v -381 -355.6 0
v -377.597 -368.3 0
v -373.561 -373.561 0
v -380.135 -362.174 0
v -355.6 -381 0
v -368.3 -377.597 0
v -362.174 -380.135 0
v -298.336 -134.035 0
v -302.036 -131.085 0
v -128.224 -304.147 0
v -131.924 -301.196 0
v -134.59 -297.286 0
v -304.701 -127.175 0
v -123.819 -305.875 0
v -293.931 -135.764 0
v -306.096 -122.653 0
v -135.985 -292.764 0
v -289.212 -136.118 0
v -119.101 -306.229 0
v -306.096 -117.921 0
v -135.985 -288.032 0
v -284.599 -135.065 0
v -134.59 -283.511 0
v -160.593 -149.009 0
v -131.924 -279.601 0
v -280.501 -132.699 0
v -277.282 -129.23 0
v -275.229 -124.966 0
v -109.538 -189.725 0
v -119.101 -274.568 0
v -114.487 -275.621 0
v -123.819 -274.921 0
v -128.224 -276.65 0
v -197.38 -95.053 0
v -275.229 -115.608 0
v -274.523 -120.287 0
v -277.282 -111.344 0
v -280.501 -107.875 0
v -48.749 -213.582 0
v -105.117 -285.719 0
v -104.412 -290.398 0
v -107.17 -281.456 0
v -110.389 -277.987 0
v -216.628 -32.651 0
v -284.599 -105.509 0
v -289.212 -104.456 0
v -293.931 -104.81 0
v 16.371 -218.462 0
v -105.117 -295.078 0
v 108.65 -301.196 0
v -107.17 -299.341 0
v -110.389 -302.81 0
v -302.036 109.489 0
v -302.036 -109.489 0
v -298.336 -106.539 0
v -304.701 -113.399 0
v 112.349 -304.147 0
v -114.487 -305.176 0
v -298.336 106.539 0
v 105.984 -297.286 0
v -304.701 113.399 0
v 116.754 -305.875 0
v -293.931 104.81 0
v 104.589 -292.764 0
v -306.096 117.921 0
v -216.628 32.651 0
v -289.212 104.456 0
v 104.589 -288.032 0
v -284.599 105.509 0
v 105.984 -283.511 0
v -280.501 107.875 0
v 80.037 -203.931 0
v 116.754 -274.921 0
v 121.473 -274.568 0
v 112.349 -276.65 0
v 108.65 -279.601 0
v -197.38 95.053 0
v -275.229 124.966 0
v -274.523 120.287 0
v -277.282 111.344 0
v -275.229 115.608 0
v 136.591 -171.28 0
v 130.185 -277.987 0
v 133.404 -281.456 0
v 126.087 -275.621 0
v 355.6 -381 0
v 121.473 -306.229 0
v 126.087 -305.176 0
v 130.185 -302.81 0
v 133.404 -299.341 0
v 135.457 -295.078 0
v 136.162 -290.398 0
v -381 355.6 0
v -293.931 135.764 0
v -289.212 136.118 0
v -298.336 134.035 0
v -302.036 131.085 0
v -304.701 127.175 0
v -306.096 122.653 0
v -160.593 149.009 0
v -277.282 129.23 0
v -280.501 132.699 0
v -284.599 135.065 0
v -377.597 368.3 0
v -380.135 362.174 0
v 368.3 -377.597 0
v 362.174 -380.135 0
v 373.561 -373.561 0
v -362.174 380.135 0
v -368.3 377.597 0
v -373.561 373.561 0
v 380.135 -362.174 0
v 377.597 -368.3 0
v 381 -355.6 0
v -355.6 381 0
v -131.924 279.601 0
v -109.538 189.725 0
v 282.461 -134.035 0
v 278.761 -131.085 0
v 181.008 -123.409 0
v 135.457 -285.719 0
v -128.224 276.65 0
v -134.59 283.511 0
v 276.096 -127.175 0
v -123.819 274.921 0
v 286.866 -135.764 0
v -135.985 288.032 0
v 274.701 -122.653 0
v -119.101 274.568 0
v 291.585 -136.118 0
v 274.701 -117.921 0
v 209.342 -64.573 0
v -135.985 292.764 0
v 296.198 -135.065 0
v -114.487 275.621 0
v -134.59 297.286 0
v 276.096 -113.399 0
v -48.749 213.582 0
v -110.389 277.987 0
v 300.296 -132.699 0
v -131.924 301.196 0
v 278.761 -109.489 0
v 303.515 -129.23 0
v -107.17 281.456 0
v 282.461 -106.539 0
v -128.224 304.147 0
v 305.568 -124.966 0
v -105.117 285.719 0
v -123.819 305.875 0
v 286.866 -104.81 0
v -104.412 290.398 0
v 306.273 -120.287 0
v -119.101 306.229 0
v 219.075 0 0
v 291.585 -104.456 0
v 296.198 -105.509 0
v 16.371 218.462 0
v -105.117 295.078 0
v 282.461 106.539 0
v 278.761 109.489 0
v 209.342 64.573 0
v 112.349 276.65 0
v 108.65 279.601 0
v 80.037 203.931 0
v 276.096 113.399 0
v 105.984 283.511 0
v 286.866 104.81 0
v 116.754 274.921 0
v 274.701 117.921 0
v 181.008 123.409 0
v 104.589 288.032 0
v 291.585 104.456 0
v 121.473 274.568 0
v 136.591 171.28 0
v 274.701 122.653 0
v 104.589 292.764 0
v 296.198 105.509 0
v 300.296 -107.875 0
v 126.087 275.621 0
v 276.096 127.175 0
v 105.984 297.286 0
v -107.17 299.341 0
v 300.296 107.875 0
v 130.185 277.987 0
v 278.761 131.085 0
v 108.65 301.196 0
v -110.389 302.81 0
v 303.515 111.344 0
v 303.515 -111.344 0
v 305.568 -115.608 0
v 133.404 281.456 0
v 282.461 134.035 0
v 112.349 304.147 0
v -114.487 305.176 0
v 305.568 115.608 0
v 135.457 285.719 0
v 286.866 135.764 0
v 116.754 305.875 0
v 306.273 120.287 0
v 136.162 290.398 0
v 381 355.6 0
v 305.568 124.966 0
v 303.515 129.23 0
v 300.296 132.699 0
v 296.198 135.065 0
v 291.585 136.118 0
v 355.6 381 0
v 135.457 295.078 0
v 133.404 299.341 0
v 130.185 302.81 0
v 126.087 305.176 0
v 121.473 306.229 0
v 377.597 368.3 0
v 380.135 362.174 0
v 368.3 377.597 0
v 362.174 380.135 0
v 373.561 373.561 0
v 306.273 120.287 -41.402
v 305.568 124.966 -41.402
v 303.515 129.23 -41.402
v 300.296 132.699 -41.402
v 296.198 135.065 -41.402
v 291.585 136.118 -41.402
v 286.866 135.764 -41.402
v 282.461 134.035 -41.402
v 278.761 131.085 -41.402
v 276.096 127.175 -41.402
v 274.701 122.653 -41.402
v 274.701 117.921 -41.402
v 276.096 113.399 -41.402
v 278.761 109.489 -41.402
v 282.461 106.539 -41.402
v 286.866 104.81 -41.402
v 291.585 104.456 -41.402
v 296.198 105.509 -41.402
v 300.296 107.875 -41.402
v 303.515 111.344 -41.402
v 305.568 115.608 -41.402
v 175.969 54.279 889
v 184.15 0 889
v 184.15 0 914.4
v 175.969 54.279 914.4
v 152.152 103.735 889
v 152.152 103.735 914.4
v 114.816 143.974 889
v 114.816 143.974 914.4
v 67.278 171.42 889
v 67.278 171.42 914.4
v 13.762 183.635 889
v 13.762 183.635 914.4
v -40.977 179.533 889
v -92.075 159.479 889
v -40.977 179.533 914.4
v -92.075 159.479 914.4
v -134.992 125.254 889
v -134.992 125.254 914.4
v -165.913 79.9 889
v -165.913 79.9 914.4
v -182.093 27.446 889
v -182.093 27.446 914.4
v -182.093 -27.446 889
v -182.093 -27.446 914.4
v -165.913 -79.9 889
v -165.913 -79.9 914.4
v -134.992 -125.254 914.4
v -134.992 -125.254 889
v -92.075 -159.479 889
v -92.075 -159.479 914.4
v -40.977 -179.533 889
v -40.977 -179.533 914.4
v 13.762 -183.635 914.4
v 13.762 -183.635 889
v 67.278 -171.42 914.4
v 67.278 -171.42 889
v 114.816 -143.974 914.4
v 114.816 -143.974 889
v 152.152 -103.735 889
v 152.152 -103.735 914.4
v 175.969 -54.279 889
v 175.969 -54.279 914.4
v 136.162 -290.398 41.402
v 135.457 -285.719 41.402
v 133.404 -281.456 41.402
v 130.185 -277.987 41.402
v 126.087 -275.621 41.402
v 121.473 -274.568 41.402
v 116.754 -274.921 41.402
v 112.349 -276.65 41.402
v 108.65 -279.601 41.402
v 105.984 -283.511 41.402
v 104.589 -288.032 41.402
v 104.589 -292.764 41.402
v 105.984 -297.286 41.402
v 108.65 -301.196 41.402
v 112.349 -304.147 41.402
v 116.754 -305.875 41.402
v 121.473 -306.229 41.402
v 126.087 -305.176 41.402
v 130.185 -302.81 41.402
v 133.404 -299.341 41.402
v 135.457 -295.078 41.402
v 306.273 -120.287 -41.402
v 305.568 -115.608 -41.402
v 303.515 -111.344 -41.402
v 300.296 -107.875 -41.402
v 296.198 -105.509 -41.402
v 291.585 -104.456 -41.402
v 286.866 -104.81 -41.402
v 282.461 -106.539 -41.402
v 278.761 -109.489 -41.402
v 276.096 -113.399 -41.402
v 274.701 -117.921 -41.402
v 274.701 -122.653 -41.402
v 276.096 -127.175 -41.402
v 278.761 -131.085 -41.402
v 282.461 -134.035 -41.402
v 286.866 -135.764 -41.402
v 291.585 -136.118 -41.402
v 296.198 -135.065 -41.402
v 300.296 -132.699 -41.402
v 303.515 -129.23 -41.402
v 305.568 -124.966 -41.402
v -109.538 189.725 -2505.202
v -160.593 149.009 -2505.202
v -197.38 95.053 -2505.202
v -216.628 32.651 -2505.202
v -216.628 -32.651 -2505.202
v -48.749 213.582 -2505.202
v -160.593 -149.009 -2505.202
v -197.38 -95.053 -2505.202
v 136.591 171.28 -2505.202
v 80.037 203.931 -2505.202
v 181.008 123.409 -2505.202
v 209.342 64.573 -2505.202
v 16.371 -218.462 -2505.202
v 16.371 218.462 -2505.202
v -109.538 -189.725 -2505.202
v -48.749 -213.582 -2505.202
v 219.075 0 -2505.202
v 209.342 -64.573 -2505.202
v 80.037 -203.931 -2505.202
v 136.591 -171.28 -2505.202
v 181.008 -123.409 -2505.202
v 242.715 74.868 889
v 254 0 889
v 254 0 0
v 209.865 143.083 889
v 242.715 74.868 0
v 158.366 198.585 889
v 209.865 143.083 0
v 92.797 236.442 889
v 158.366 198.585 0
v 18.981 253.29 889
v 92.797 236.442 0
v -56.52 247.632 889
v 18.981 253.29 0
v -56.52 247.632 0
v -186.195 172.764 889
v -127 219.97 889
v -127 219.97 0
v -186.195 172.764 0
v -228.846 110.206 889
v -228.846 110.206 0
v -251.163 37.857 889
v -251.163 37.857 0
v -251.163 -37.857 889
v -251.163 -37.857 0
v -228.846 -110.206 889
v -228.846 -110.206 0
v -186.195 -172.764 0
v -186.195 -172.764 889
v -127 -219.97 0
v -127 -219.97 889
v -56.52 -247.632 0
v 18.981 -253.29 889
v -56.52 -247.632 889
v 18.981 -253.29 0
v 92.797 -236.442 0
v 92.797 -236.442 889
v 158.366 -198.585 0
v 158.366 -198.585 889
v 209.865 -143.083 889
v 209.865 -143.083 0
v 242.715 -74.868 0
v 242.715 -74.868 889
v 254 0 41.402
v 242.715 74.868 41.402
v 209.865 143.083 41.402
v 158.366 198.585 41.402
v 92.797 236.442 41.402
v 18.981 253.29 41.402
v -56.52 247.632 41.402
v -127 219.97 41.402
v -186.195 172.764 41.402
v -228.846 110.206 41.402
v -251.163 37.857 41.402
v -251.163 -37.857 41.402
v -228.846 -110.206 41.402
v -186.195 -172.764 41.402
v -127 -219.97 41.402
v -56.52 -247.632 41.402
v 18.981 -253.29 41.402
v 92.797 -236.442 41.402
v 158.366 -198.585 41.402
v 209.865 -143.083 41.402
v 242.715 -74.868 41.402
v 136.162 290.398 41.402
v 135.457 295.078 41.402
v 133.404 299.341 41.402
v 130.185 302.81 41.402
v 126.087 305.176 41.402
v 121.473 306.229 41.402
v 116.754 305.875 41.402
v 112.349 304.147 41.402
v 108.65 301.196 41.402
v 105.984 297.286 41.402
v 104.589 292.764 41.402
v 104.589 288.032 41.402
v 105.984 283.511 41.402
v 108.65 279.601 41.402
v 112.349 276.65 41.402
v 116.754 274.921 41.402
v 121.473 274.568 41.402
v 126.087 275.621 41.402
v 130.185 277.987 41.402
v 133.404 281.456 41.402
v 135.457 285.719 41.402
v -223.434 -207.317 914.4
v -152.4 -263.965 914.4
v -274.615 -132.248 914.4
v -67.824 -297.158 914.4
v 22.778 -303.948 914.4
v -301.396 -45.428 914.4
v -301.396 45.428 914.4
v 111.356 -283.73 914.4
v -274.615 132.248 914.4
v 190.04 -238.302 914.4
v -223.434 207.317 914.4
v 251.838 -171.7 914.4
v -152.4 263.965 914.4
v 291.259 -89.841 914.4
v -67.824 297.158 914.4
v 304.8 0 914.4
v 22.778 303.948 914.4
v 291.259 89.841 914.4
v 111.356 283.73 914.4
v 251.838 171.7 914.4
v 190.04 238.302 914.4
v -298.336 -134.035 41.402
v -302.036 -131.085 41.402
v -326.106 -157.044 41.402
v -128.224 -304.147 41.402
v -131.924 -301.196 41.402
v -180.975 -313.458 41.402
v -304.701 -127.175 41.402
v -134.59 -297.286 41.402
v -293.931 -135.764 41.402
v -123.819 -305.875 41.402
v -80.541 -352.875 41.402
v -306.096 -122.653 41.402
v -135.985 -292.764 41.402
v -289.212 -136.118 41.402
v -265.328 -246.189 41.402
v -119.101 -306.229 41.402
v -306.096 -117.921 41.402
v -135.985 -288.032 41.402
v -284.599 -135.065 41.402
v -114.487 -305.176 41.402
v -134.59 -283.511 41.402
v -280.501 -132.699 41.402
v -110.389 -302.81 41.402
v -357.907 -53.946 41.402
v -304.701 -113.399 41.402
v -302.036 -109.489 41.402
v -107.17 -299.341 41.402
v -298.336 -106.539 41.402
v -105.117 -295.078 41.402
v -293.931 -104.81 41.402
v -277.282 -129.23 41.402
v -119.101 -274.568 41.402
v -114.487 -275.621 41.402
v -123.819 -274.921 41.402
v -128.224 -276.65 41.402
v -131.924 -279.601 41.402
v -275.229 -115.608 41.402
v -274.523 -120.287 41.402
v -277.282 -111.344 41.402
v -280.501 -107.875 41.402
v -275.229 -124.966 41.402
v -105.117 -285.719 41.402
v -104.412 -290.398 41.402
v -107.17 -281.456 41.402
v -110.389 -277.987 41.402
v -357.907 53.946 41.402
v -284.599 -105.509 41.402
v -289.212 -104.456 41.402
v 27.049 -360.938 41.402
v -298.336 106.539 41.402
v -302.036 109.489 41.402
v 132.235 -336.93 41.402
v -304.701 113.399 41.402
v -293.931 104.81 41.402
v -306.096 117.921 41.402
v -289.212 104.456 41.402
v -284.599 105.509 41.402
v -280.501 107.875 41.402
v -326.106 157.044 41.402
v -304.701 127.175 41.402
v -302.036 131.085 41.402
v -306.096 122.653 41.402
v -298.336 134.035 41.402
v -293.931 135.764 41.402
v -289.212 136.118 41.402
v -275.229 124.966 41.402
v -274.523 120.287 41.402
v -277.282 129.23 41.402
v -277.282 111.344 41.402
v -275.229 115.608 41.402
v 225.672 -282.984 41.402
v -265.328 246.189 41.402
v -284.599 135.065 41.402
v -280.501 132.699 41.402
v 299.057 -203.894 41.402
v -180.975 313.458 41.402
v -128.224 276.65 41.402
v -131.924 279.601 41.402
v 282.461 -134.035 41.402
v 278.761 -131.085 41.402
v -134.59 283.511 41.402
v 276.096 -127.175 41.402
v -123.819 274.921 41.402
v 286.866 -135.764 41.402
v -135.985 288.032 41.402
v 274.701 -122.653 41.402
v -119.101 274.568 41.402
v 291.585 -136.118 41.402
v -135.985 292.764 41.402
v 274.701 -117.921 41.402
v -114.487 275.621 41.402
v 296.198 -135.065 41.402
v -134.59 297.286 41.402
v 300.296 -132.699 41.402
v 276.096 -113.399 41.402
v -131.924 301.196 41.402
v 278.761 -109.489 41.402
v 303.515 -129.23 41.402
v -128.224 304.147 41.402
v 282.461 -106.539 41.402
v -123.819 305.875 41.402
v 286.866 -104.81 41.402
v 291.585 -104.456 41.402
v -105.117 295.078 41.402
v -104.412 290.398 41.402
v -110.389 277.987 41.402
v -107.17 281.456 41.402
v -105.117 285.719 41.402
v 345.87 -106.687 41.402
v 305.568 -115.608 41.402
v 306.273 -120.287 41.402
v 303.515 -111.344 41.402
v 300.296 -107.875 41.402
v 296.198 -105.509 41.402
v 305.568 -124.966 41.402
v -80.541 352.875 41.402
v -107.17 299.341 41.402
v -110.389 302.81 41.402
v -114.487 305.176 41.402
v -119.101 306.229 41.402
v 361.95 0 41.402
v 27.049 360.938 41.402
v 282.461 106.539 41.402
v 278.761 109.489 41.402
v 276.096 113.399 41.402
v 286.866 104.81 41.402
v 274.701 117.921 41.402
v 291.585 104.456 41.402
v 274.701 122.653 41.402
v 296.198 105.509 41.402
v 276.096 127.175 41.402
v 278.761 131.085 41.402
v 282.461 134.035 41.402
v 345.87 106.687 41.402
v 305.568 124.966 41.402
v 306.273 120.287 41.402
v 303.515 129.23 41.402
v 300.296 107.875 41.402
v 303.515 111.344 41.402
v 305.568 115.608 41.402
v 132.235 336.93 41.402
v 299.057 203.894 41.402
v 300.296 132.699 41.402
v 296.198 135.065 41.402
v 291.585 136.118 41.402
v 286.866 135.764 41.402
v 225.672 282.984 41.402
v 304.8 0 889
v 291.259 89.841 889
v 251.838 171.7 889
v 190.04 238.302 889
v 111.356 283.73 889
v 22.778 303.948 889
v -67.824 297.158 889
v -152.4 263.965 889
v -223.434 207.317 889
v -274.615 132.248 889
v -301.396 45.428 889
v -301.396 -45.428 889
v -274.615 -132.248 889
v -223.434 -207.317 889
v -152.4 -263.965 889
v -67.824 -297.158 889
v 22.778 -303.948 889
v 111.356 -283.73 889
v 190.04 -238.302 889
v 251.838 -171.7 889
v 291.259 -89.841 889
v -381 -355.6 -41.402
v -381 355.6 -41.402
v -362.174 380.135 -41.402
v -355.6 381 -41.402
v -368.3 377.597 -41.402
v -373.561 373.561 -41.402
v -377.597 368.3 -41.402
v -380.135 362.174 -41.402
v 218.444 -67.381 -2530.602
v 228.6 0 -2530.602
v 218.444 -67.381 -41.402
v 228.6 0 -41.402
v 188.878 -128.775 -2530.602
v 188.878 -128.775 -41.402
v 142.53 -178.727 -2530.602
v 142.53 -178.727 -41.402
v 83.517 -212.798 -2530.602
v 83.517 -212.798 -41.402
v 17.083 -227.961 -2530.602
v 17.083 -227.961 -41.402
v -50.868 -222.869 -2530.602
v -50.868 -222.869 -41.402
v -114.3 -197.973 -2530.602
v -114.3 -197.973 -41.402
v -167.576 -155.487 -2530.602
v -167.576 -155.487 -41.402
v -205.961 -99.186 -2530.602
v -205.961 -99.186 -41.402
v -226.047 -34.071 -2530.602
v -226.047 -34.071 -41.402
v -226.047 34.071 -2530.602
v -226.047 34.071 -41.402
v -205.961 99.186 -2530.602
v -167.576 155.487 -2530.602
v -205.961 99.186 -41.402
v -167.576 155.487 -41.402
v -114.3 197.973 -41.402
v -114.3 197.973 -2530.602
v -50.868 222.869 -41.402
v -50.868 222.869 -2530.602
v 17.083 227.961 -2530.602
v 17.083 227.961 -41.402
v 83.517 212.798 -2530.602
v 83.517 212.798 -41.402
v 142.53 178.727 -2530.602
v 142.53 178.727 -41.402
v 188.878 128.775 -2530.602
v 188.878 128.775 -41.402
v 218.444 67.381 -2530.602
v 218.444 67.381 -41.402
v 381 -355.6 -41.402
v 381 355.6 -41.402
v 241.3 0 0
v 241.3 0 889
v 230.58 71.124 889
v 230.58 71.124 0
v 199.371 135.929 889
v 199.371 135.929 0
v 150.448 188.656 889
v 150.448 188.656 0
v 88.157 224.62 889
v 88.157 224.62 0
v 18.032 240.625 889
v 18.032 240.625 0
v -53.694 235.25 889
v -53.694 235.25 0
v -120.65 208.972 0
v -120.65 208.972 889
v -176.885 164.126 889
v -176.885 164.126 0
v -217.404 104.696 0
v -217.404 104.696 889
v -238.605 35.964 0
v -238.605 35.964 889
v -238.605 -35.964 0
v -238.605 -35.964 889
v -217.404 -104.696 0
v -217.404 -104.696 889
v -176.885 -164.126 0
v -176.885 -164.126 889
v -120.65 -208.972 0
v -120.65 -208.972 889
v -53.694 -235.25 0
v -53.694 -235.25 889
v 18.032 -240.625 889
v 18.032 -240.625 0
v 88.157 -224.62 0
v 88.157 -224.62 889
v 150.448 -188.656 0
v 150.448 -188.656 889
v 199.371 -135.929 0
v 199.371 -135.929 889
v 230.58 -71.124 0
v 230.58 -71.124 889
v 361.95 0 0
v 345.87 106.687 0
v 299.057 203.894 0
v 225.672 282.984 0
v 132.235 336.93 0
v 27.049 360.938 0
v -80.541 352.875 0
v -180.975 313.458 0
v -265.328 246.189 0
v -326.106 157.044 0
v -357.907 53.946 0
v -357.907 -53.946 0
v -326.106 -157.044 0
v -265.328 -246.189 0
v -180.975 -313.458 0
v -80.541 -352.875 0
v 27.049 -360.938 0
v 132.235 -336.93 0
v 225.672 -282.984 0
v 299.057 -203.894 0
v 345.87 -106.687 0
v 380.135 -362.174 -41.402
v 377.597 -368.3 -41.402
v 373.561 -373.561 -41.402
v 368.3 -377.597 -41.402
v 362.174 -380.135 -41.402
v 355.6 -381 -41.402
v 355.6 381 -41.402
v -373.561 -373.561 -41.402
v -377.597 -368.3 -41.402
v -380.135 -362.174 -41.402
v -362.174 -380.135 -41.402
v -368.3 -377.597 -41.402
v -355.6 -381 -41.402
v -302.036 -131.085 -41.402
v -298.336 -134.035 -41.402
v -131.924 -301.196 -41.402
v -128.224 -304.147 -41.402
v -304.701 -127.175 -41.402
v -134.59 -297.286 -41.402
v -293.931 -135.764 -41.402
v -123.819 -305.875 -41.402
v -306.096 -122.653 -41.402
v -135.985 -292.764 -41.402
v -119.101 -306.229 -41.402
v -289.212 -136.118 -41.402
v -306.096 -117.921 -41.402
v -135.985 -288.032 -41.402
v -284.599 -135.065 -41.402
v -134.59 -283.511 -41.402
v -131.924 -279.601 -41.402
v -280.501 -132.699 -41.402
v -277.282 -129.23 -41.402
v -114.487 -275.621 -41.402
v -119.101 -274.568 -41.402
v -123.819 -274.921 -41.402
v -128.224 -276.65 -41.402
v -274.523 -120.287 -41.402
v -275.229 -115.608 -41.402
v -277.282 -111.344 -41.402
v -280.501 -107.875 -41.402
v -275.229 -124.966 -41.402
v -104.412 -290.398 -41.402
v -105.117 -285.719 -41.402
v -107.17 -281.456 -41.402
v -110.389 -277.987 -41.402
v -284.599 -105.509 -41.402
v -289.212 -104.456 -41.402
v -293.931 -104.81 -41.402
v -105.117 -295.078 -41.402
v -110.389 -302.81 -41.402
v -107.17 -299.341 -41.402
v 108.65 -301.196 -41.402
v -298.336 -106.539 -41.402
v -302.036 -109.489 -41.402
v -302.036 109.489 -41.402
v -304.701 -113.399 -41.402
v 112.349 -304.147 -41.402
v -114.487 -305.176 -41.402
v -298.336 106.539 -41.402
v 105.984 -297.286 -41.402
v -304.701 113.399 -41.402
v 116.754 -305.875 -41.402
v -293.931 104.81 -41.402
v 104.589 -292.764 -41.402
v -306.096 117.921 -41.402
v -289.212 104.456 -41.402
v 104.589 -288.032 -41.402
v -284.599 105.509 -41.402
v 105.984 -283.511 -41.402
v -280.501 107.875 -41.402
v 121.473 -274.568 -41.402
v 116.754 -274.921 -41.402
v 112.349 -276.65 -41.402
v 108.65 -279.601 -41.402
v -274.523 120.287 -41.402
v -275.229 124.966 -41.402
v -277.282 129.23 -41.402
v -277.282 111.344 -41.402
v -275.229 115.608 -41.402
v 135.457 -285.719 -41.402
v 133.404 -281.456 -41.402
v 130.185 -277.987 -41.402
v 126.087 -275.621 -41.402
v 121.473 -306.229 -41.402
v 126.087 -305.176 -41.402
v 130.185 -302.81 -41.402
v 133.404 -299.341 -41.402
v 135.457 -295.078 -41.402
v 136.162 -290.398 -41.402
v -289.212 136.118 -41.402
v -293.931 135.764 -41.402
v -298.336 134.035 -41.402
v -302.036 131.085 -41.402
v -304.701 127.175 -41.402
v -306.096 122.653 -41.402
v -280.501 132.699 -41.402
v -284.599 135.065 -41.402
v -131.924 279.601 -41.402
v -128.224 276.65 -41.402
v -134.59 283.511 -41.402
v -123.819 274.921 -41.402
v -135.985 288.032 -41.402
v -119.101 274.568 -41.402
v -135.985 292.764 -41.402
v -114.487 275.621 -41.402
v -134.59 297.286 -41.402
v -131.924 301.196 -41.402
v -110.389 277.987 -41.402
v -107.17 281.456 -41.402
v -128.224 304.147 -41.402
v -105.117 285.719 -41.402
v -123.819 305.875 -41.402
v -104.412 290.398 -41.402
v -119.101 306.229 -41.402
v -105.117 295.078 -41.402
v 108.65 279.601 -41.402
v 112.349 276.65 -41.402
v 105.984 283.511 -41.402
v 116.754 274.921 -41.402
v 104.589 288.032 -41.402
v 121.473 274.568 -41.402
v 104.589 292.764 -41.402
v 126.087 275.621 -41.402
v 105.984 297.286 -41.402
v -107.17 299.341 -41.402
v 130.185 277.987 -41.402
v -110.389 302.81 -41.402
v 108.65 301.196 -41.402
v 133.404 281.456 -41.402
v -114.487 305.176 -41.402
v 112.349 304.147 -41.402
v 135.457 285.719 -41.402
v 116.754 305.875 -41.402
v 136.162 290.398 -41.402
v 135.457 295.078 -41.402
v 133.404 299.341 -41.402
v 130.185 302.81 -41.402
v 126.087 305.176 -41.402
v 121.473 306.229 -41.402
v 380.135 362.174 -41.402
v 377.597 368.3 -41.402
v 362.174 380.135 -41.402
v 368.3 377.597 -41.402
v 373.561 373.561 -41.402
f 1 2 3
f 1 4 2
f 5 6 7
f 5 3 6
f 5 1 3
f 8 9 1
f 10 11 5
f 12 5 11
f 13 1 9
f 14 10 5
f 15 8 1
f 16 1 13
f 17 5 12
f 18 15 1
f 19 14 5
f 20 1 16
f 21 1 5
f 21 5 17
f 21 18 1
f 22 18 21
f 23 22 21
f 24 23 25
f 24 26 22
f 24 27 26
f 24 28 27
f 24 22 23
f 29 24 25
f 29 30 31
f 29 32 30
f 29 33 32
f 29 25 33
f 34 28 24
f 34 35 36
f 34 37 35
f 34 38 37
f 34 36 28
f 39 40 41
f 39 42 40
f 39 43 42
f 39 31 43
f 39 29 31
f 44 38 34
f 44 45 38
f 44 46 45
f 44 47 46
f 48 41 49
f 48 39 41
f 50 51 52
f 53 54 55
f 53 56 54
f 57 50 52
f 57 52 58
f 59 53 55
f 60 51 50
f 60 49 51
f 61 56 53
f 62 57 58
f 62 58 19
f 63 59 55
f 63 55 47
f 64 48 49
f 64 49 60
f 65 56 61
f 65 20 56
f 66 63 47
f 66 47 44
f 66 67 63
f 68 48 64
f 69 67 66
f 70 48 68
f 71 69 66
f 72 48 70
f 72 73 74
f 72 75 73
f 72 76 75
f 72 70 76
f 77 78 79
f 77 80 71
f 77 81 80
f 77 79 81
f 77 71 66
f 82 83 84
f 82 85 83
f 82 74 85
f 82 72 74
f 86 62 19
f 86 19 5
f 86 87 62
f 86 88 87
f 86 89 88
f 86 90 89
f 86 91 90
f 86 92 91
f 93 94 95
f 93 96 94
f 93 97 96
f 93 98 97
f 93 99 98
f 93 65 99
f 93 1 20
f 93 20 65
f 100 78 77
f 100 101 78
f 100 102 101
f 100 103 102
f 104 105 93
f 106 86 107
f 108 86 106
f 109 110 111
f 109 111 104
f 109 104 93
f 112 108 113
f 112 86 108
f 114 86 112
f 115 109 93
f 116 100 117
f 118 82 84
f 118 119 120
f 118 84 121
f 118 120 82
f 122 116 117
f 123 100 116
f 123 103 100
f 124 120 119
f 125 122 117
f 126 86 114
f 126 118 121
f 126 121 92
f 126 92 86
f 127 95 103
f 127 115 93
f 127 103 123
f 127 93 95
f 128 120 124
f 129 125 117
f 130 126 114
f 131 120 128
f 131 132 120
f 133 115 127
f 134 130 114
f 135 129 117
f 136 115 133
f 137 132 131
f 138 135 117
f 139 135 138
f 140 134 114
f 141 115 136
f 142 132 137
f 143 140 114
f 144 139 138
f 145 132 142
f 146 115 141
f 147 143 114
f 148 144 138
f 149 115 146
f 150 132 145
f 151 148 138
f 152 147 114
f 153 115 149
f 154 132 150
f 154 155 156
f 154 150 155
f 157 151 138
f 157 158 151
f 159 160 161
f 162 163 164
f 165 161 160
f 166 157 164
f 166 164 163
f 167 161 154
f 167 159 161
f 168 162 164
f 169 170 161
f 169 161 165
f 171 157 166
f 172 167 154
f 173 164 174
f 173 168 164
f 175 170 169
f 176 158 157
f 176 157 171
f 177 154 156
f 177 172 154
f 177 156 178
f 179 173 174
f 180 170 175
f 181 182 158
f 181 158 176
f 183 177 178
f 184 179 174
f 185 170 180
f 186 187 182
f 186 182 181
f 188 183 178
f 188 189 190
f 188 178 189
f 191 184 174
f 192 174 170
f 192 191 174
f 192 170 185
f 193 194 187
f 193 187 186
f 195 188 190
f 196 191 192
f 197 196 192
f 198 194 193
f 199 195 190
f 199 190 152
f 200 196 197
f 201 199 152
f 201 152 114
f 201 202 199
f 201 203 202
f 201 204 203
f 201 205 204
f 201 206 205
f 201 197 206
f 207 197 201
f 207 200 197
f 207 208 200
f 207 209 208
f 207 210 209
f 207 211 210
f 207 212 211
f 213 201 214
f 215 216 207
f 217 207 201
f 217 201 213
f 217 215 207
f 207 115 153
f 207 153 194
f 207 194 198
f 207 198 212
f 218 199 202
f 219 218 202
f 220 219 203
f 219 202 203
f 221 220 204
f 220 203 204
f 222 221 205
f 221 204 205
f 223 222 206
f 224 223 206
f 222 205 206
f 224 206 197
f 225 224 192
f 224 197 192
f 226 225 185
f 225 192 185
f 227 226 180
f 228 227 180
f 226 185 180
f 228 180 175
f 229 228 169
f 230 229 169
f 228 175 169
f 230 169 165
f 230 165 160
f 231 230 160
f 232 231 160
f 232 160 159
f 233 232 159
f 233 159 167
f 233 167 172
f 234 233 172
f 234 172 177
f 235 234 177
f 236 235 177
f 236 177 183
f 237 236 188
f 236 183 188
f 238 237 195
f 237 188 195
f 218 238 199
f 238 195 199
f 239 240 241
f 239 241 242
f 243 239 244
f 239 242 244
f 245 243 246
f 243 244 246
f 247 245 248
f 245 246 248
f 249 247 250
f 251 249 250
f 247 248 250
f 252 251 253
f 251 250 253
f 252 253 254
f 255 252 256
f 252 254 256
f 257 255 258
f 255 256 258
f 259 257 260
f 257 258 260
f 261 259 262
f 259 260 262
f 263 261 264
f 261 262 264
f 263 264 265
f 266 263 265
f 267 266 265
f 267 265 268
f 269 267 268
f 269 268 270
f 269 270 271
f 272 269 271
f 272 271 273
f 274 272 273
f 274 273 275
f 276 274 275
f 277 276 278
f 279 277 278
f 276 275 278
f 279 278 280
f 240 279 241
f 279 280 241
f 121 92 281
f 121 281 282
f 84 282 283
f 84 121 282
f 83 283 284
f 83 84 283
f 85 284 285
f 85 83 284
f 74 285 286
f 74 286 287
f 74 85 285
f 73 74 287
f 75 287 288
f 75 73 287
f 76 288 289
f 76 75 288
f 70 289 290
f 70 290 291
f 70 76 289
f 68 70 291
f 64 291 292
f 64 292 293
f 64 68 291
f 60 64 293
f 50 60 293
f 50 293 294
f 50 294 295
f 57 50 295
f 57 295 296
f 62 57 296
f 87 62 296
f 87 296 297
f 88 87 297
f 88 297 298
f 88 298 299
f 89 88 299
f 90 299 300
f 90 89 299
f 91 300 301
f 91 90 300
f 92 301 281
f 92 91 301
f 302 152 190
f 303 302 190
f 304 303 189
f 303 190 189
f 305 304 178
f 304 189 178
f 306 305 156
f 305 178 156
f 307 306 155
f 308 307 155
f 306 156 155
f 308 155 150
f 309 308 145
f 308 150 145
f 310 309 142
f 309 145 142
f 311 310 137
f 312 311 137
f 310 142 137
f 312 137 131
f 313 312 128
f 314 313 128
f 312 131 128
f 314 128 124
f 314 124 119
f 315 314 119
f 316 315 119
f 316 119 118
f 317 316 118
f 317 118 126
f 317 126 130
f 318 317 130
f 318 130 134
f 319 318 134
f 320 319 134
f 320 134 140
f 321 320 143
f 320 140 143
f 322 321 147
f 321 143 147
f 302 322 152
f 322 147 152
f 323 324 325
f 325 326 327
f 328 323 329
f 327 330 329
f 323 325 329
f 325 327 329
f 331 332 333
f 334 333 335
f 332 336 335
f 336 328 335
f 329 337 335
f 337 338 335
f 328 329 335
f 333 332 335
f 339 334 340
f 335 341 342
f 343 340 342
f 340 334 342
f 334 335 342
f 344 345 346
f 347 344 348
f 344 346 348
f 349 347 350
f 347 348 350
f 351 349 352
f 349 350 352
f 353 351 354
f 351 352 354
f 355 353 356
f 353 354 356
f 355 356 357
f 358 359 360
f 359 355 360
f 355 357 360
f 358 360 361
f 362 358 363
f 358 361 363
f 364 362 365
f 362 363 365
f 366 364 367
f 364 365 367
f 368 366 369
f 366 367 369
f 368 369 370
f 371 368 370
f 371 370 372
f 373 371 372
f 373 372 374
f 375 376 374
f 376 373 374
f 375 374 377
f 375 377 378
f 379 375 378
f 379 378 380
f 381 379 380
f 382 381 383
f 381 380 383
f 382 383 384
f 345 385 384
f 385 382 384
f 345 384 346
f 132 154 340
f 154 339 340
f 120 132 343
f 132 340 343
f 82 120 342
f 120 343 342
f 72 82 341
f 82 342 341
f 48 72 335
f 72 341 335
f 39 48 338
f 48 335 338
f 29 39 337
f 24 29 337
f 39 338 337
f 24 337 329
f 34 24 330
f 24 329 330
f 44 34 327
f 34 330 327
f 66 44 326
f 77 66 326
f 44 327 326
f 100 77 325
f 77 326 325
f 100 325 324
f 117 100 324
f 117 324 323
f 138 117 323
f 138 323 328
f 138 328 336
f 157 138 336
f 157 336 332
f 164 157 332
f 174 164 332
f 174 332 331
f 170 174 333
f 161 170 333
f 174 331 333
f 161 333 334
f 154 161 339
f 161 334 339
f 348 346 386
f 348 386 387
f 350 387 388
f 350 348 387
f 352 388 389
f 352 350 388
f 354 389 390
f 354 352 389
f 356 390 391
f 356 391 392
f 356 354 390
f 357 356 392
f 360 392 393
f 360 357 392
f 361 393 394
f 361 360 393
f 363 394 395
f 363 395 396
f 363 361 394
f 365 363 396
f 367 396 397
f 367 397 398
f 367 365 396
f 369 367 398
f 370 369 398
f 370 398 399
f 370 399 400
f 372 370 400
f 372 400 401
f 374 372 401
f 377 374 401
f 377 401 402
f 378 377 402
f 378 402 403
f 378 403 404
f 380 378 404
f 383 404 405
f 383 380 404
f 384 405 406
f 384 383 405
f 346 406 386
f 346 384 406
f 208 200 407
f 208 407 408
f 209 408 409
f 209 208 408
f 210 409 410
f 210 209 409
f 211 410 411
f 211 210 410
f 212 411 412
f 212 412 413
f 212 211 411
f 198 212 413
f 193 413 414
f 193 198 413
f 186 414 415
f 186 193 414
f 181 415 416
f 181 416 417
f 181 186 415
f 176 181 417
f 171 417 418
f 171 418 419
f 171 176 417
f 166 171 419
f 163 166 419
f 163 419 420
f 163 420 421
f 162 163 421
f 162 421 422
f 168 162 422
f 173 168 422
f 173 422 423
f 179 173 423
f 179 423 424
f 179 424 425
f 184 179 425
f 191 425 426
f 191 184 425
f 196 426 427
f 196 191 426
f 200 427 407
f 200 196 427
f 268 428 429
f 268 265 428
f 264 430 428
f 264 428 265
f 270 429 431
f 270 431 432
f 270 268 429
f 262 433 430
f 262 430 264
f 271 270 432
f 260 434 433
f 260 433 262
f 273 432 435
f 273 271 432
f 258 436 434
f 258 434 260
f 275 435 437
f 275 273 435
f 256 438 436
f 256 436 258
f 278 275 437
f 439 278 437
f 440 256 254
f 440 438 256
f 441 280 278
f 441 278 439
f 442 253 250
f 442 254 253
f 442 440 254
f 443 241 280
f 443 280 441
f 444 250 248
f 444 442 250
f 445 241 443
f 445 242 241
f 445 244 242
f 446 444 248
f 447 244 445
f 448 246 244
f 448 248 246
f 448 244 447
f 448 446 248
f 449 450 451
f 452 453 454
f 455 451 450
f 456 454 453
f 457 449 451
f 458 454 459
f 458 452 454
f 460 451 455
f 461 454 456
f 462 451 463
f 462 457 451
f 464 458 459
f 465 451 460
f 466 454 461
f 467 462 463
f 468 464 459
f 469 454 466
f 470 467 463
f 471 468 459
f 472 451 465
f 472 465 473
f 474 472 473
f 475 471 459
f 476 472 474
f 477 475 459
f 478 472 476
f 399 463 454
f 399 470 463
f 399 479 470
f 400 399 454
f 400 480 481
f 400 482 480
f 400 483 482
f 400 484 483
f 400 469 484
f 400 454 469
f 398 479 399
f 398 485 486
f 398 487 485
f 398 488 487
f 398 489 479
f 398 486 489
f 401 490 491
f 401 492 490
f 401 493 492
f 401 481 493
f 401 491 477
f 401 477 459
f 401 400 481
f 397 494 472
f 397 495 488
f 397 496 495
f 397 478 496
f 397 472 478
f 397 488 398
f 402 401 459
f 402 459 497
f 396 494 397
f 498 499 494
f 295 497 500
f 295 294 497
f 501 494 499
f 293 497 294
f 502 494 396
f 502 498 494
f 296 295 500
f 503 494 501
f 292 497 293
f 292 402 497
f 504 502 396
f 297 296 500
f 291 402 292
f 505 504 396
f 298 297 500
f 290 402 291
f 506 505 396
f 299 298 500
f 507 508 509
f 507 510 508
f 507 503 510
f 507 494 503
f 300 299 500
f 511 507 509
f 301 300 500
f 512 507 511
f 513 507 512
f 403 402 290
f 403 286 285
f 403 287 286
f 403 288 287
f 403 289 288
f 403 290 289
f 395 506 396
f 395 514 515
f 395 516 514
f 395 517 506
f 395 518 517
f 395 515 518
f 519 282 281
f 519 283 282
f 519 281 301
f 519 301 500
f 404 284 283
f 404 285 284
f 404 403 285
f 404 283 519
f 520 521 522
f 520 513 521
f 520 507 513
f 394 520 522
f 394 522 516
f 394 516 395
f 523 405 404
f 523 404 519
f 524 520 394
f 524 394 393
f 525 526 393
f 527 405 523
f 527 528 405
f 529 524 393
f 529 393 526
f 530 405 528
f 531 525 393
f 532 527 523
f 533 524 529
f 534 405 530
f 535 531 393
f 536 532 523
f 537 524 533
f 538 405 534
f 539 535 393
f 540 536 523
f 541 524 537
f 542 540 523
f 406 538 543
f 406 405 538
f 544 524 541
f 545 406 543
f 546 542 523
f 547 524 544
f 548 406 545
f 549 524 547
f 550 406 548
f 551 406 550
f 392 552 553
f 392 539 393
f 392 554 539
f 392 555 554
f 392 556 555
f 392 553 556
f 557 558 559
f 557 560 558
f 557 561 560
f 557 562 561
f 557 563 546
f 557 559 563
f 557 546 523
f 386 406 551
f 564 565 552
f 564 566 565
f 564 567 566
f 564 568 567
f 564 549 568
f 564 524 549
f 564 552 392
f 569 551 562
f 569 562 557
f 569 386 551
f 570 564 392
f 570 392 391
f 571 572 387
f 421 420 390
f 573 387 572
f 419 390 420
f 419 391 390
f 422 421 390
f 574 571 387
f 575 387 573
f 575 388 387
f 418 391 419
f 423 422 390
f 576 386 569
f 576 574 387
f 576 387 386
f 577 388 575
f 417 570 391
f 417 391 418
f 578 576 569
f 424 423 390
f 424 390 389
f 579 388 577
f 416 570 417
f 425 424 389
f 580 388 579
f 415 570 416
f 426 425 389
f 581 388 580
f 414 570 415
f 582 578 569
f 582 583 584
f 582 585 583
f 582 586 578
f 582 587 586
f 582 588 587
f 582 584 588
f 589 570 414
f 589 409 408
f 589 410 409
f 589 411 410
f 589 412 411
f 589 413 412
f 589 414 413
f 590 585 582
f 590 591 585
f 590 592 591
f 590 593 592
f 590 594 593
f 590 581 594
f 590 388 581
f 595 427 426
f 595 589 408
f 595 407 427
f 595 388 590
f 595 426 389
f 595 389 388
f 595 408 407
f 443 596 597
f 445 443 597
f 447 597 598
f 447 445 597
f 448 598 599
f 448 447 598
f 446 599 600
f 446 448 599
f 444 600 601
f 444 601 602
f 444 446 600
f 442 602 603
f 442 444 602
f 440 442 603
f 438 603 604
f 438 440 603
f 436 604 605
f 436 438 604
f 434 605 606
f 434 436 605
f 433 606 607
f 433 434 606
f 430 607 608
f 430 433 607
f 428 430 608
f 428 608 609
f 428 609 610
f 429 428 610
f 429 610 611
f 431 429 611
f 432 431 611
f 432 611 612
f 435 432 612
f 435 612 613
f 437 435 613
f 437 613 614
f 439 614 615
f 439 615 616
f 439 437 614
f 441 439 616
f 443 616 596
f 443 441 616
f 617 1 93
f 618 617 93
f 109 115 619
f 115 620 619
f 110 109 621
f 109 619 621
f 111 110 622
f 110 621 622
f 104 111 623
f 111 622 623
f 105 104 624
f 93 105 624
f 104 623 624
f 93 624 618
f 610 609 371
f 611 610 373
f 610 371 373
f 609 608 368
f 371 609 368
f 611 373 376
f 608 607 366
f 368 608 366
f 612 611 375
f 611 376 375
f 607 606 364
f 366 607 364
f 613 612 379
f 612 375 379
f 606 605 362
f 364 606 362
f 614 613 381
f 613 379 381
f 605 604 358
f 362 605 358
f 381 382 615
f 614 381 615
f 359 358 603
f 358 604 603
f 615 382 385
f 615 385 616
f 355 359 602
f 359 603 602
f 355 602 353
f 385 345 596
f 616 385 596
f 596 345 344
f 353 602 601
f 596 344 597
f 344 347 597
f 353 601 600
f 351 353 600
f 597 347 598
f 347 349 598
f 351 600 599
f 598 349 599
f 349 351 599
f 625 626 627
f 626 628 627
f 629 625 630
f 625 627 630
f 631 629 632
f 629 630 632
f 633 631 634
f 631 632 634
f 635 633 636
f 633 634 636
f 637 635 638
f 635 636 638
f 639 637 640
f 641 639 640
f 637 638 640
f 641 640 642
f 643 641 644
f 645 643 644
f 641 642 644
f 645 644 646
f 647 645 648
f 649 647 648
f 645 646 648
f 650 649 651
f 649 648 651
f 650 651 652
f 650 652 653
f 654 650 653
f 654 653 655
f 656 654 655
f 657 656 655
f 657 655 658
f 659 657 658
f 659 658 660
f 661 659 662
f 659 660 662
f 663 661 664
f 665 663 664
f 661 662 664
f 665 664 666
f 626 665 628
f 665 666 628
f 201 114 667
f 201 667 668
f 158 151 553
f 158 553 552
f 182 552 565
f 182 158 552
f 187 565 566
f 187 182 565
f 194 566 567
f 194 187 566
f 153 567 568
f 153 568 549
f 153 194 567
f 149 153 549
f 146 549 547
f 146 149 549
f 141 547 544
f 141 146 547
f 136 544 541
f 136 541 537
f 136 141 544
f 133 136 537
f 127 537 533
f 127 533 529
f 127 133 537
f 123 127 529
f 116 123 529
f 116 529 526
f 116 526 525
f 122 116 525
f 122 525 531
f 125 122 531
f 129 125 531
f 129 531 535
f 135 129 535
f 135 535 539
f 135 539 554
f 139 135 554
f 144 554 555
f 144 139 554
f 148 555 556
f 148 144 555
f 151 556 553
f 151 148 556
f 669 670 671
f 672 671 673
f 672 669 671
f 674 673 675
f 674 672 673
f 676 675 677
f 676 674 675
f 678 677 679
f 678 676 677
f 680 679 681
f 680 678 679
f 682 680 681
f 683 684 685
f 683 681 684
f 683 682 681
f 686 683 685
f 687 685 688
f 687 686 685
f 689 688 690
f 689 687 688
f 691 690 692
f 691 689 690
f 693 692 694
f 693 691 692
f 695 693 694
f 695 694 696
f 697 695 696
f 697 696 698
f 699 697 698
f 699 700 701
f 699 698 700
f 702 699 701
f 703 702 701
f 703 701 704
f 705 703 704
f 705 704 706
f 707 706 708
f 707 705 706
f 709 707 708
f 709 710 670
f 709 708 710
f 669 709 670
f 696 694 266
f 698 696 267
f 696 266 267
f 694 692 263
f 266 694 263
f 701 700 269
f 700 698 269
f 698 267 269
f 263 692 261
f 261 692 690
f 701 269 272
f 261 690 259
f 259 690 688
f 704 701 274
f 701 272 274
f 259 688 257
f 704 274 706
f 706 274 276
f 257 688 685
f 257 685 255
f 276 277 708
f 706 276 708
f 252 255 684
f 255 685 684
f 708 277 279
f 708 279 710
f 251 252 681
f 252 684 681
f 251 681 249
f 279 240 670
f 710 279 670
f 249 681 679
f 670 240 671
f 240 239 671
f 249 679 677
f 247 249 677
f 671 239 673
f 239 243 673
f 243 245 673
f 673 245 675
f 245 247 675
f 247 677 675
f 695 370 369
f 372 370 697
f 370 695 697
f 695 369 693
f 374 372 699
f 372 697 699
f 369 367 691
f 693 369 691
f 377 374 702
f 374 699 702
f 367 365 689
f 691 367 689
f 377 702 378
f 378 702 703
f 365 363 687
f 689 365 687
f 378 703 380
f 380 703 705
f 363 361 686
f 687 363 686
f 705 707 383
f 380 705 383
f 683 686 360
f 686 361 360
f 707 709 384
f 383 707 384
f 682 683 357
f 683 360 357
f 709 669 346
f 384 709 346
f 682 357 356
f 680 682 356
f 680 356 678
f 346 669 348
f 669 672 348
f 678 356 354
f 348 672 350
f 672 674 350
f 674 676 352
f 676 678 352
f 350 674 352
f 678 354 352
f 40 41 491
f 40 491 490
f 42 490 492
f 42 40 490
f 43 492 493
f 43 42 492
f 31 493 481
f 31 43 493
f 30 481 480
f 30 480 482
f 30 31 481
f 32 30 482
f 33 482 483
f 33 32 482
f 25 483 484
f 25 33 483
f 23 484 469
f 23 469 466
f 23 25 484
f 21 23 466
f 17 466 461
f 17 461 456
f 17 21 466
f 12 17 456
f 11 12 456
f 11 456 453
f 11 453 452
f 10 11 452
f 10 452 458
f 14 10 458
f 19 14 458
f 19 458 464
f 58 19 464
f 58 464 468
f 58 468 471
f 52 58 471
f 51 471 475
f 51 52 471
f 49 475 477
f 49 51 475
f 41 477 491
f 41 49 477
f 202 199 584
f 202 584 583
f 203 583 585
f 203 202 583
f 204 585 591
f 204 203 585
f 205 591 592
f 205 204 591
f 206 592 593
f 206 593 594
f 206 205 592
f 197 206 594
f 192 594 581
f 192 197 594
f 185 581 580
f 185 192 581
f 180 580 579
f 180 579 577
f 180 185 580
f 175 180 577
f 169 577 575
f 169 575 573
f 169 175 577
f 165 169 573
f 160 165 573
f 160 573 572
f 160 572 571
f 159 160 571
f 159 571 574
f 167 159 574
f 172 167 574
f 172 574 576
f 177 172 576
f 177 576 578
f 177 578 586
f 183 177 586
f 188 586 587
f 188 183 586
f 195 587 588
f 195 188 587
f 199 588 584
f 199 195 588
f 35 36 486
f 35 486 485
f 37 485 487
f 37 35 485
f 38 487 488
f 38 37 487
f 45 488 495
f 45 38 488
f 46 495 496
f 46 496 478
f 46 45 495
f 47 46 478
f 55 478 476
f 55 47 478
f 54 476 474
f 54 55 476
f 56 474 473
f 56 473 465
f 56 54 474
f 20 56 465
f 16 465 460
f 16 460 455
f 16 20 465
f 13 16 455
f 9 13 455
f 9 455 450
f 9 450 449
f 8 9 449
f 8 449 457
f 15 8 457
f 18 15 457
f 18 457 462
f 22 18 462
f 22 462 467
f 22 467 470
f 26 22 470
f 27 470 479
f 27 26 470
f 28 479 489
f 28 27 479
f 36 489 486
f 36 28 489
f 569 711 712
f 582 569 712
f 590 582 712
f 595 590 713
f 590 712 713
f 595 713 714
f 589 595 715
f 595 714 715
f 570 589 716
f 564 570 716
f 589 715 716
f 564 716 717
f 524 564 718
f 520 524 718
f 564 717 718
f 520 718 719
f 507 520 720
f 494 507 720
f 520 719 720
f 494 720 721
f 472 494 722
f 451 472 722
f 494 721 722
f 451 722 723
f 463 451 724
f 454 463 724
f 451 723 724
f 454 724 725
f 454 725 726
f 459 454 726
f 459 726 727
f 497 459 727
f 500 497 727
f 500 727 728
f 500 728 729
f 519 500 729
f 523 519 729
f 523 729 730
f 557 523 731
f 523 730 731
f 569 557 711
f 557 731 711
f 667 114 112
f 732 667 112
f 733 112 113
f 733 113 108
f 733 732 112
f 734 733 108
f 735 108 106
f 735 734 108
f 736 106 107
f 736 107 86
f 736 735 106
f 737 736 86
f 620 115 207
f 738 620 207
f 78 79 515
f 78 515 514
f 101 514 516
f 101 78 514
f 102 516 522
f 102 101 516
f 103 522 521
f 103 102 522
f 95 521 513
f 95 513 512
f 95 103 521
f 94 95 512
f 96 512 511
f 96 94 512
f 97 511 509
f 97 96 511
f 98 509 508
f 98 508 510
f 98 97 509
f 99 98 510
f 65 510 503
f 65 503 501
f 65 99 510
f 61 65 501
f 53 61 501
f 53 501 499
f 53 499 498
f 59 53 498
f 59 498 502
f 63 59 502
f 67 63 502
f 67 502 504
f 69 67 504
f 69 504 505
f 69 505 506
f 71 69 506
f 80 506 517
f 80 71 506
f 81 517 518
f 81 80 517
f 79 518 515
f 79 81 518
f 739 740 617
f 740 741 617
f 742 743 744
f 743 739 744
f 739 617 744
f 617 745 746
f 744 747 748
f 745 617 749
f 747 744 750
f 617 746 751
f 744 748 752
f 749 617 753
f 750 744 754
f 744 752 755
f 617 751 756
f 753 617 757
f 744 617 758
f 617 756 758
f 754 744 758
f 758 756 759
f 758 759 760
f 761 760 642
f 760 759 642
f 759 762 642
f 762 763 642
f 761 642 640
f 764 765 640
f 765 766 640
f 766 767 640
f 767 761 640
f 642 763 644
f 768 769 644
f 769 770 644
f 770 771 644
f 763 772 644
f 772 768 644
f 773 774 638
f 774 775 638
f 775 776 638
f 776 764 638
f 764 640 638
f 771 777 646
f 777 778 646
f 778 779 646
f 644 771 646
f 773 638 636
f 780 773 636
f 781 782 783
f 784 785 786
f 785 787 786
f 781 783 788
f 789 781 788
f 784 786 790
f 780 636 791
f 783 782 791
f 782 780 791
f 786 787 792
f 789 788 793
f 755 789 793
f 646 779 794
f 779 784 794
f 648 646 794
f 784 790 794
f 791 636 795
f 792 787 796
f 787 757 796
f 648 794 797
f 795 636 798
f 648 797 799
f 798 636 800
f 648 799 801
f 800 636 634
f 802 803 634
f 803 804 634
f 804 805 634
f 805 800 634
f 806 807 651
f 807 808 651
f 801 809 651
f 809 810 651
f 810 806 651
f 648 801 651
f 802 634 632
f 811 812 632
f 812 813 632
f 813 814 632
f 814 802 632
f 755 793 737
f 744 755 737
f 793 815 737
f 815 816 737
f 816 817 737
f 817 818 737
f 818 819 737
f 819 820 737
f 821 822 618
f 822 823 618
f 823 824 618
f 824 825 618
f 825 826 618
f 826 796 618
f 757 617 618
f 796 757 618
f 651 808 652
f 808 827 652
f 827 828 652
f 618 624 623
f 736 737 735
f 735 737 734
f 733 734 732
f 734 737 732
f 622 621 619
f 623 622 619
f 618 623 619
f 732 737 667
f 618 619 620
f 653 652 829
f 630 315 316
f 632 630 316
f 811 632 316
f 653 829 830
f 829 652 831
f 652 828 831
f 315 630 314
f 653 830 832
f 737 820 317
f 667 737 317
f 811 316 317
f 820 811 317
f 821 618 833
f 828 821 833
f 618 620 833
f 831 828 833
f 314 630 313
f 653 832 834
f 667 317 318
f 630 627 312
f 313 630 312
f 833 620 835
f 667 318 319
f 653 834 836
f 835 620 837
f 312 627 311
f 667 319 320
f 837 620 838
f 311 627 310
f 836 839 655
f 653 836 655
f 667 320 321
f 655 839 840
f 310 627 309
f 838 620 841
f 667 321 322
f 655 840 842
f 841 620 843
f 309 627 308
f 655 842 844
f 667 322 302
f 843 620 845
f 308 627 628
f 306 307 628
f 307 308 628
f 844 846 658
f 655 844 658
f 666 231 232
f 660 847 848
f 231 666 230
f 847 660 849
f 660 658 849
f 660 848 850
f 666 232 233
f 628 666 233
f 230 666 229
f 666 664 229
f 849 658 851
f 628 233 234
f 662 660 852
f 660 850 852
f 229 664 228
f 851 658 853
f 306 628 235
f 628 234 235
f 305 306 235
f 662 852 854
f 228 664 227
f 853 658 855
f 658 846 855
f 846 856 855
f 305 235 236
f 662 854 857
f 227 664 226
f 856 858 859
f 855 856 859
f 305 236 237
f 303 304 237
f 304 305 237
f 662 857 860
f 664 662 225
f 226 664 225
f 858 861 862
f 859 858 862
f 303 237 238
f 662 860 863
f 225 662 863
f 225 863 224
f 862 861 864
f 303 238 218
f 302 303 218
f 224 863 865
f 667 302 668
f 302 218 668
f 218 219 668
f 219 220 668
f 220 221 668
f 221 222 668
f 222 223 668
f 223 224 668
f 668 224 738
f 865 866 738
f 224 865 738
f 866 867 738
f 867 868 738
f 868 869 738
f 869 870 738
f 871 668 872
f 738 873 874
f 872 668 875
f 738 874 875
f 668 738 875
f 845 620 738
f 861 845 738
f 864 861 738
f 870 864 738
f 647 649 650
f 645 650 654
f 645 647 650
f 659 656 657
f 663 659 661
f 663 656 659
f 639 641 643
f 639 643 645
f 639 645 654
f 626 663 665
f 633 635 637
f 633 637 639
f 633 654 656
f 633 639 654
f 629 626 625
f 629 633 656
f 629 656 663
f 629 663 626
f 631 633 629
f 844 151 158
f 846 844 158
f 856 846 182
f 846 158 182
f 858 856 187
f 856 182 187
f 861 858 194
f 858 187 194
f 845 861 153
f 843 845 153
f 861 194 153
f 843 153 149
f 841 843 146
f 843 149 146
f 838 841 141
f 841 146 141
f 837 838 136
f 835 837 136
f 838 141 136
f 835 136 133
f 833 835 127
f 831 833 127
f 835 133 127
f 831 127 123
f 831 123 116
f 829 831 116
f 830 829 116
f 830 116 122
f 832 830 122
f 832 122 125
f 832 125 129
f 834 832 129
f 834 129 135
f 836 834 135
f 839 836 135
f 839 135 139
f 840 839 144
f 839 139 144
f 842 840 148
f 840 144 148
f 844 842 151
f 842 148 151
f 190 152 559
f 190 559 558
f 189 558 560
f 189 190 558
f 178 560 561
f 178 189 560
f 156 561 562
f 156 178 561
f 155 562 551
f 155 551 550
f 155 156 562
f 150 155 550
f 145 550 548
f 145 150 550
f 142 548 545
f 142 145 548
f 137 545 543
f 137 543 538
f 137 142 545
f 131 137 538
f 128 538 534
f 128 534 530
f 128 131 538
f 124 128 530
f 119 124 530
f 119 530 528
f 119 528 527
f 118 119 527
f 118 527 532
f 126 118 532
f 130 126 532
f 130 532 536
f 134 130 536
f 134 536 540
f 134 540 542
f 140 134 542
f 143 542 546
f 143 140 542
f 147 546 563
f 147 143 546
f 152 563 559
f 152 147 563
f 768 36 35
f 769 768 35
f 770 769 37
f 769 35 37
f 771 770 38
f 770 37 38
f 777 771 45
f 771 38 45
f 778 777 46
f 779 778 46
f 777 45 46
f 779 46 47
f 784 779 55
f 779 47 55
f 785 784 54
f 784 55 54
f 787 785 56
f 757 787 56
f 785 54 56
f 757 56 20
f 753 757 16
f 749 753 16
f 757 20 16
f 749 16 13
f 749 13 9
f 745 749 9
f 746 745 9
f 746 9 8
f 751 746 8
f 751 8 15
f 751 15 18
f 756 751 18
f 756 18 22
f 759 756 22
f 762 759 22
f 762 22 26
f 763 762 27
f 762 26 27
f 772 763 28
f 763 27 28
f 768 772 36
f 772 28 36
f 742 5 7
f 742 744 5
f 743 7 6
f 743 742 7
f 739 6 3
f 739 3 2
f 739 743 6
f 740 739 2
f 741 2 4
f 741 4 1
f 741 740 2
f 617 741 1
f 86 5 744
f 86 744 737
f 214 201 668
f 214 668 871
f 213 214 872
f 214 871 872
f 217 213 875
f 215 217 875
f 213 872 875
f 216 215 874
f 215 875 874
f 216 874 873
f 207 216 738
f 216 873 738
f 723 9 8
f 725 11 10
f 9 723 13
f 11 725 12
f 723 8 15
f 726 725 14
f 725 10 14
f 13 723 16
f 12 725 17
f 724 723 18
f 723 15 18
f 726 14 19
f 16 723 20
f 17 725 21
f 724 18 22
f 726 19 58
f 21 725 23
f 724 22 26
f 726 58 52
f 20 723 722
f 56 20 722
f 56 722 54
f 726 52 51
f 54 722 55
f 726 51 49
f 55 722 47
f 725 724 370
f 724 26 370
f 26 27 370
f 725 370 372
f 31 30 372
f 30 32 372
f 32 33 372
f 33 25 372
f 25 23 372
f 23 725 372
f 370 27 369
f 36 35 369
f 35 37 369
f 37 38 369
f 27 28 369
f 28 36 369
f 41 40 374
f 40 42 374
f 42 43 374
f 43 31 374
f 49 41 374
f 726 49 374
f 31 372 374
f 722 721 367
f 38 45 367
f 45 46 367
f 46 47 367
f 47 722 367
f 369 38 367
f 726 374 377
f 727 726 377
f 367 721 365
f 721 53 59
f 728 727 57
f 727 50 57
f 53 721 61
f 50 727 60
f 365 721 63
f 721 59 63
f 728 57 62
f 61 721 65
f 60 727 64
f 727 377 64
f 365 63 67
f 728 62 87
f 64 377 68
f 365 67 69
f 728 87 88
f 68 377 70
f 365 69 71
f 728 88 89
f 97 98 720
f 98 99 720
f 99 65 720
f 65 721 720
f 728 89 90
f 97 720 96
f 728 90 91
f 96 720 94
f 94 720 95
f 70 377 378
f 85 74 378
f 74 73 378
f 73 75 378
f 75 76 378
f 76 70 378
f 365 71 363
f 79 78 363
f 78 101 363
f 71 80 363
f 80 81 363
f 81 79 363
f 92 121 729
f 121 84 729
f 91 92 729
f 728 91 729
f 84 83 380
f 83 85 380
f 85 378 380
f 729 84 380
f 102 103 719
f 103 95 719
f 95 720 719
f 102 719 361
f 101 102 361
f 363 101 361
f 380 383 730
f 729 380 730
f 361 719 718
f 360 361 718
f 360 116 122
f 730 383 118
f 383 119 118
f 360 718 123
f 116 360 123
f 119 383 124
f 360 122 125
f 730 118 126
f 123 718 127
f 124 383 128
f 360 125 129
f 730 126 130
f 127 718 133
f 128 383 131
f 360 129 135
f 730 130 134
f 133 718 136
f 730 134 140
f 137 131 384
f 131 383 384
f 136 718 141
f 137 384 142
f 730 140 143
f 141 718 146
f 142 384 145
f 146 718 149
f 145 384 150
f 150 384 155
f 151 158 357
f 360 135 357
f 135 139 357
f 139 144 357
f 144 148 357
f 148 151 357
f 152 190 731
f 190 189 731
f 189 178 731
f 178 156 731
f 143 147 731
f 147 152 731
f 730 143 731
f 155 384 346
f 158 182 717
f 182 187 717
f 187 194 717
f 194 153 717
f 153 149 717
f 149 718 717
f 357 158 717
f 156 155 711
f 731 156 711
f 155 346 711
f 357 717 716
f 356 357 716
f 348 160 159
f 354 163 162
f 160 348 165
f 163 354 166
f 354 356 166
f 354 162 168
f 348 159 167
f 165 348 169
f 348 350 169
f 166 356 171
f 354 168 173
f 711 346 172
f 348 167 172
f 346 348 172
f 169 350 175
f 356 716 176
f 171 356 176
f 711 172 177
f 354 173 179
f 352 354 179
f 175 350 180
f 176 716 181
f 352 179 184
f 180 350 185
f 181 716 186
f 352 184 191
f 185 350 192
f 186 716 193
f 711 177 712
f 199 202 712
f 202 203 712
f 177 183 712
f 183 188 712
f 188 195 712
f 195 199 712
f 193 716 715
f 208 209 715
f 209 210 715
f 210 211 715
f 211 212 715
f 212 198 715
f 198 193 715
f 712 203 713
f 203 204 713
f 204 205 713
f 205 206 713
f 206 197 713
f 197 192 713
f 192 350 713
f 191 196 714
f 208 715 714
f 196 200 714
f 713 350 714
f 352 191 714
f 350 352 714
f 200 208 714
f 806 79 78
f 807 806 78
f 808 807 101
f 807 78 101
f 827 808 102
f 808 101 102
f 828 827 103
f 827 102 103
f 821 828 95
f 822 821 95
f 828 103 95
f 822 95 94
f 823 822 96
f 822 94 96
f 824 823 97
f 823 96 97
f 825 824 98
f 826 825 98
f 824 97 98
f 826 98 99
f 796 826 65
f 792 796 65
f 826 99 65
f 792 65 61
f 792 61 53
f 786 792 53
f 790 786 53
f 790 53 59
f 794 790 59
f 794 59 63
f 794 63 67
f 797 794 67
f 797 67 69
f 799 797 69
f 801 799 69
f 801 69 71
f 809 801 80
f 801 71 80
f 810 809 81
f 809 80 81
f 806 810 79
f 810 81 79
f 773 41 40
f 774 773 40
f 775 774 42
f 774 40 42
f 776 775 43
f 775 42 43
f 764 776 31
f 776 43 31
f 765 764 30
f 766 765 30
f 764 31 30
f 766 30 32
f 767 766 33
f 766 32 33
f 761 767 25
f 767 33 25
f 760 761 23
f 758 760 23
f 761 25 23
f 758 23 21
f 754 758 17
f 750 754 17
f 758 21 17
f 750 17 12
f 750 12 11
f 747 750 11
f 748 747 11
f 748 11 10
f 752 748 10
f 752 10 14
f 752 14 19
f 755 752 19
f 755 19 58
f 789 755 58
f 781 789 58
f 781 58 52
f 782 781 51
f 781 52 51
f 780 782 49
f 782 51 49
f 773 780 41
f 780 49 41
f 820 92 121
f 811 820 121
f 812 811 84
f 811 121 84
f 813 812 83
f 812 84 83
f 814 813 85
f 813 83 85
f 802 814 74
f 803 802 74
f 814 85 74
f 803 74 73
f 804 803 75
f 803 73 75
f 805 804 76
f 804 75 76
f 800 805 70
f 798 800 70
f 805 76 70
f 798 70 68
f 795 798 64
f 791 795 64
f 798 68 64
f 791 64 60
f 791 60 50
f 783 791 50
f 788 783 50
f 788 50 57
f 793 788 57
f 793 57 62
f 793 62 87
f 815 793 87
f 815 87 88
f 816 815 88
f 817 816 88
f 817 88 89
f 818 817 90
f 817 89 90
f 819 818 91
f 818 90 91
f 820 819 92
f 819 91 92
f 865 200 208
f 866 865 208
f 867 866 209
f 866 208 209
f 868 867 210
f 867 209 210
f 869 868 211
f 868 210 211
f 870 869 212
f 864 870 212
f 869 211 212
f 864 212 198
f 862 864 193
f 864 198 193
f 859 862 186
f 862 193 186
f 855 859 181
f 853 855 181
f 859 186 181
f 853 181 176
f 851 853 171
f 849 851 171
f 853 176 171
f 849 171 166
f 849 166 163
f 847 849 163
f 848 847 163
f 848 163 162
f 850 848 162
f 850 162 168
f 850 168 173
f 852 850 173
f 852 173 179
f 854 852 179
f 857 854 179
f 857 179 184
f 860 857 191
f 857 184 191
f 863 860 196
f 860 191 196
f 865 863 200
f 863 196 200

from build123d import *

# Parameters (mm, degrees)
F0_W          = 762
F0_H          = 762
F0_R          = 15.875
F0_R_2        = 228.6
F1_DEPTH      = 41.402
F2_R          = 228.6
F2_R_2        = 219.075
F3_DEPTH      = 2489.2
F3_DEPTH_BACK = 41.402
F4_R          = 228.6
F5_DEPTH      = 25.4
F6_R          = 25.4
F7_R          = 361.95
F7_R_2        = 15.875
F7_R_3        = 254
F8_DEPTH      = 41.402
F9_R          = 254
F9_R_2        = 241.3
F10_DEPTH     = 914.4
F11_R         = 304.8
F11_R_2       = 184.15
F12_DEPTH     = 25.4


with BuildPart() as f1:
    # F0 (on Top) → F1 (new body)
    with BuildSketch(Plane.XY):
        Rectangle(F0_W, F0_H)
        with Locations((-120.28697, -290.398434)):
            Circle(F0_R, mode=Mode.SUBTRACT)
        with Locations((-290.398434, -120.28697)):
            Circle(F0_R, mode=Mode.SUBTRACT)
        with Locations((120.28697, -290.398434)):
            Circle(F0_R, mode=Mode.SUBTRACT)
        with Locations((290.398434, -120.28697)):
            Circle(F0_R, mode=Mode.SUBTRACT)
        with Locations((-290.398434, 120.28697)):
            Circle(F0_R, mode=Mode.SUBTRACT)
        with Locations((-120.28697, 290.398434)):
            Circle(F0_R, mode=Mode.SUBTRACT)
        Circle(F0_R_2, mode=Mode.SUBTRACT)
        with Locations((290.398434, 120.28697)):
            Circle(F0_R, mode=Mode.SUBTRACT)
        with Locations((120.28697, 290.398434)):
            Circle(F0_R, mode=Mode.SUBTRACT)
    extrude(amount=-F1_DEPTH)

    # F2 (on face) → F3 (join, two sides)
    with BuildSketch(Plane(origin=(0, 0, -41.402), x_dir=(1, 0, 0), z_dir=(0, 0, -1))) as f3_sk:
        Circle(F2_R)
        Circle(F2_R_2, mode=Mode.SUBTRACT)
    extrude(amount=F3_DEPTH)
    extrude(f3_sk.sketch, amount=-F3_DEPTH_BACK)

    # F4 (on face) → F5 (join)
    with BuildSketch(Plane(origin=(0, 0, -2530.602), x_dir=(1, 0, 0), z_dir=(0, 0, -1))):
        Circle(F4_R)
    extrude(amount=-F5_DEPTH)

    # F6
    f6_edges = [f1.edges().sort_by_distance(p)[0] for p in [
        (381, -381, -20.701),
        (381, 381, -20.701),
        (-381, -381, -20.701),
        (-381, 381, -20.701),
    ]]
    fillet(f6_edges, radius=F6_R)


with BuildPart() as f8:
    # F7 (on face) → F8 (new body)
    with BuildSketch(Plane.XY):
        Circle(F7_R)
        with Locations((-120.28697, -290.398434)):
            Circle(F7_R_2, mode=Mode.SUBTRACT)
        with Locations((-290.398434, -120.28697)):
            Circle(F7_R_2, mode=Mode.SUBTRACT)
        with Locations((120.28697, -290.398434)):
            Circle(F7_R_2, mode=Mode.SUBTRACT)
        with Locations((290.398434, -120.28697)):
            Circle(F7_R_2, mode=Mode.SUBTRACT)
        with Locations((-290.398434, 120.28697)):
            Circle(F7_R_2, mode=Mode.SUBTRACT)
        with Locations((-120.28697, 290.398434)):
            Circle(F7_R_2, mode=Mode.SUBTRACT)
        Circle(F7_R_3, mode=Mode.SUBTRACT)
        with Locations((290.398434, 120.28697)):
            Circle(F7_R_2, mode=Mode.SUBTRACT)
        with Locations((120.28697, 290.398434)):
            Circle(F7_R_2, mode=Mode.SUBTRACT)
    extrude(amount=F8_DEPTH)


with BuildPart() as f10:
    # F9 (on face) → F10 (new body)
    with BuildSketch(Plane.XY):
        Circle(F9_R)
        Circle(F9_R_2, mode=Mode.SUBTRACT)
    extrude(amount=F10_DEPTH)

    # F11 (on face) → F12 (join)
    with BuildSketch(Plane.XY.offset(914.4)):
        Circle(F11_R)
        Circle(F11_R_2, mode=Mode.SUBTRACT)
    extrude(amount=-F12_DEPTH)


solid = Compound([f1.part, f8.part, f10.part])
